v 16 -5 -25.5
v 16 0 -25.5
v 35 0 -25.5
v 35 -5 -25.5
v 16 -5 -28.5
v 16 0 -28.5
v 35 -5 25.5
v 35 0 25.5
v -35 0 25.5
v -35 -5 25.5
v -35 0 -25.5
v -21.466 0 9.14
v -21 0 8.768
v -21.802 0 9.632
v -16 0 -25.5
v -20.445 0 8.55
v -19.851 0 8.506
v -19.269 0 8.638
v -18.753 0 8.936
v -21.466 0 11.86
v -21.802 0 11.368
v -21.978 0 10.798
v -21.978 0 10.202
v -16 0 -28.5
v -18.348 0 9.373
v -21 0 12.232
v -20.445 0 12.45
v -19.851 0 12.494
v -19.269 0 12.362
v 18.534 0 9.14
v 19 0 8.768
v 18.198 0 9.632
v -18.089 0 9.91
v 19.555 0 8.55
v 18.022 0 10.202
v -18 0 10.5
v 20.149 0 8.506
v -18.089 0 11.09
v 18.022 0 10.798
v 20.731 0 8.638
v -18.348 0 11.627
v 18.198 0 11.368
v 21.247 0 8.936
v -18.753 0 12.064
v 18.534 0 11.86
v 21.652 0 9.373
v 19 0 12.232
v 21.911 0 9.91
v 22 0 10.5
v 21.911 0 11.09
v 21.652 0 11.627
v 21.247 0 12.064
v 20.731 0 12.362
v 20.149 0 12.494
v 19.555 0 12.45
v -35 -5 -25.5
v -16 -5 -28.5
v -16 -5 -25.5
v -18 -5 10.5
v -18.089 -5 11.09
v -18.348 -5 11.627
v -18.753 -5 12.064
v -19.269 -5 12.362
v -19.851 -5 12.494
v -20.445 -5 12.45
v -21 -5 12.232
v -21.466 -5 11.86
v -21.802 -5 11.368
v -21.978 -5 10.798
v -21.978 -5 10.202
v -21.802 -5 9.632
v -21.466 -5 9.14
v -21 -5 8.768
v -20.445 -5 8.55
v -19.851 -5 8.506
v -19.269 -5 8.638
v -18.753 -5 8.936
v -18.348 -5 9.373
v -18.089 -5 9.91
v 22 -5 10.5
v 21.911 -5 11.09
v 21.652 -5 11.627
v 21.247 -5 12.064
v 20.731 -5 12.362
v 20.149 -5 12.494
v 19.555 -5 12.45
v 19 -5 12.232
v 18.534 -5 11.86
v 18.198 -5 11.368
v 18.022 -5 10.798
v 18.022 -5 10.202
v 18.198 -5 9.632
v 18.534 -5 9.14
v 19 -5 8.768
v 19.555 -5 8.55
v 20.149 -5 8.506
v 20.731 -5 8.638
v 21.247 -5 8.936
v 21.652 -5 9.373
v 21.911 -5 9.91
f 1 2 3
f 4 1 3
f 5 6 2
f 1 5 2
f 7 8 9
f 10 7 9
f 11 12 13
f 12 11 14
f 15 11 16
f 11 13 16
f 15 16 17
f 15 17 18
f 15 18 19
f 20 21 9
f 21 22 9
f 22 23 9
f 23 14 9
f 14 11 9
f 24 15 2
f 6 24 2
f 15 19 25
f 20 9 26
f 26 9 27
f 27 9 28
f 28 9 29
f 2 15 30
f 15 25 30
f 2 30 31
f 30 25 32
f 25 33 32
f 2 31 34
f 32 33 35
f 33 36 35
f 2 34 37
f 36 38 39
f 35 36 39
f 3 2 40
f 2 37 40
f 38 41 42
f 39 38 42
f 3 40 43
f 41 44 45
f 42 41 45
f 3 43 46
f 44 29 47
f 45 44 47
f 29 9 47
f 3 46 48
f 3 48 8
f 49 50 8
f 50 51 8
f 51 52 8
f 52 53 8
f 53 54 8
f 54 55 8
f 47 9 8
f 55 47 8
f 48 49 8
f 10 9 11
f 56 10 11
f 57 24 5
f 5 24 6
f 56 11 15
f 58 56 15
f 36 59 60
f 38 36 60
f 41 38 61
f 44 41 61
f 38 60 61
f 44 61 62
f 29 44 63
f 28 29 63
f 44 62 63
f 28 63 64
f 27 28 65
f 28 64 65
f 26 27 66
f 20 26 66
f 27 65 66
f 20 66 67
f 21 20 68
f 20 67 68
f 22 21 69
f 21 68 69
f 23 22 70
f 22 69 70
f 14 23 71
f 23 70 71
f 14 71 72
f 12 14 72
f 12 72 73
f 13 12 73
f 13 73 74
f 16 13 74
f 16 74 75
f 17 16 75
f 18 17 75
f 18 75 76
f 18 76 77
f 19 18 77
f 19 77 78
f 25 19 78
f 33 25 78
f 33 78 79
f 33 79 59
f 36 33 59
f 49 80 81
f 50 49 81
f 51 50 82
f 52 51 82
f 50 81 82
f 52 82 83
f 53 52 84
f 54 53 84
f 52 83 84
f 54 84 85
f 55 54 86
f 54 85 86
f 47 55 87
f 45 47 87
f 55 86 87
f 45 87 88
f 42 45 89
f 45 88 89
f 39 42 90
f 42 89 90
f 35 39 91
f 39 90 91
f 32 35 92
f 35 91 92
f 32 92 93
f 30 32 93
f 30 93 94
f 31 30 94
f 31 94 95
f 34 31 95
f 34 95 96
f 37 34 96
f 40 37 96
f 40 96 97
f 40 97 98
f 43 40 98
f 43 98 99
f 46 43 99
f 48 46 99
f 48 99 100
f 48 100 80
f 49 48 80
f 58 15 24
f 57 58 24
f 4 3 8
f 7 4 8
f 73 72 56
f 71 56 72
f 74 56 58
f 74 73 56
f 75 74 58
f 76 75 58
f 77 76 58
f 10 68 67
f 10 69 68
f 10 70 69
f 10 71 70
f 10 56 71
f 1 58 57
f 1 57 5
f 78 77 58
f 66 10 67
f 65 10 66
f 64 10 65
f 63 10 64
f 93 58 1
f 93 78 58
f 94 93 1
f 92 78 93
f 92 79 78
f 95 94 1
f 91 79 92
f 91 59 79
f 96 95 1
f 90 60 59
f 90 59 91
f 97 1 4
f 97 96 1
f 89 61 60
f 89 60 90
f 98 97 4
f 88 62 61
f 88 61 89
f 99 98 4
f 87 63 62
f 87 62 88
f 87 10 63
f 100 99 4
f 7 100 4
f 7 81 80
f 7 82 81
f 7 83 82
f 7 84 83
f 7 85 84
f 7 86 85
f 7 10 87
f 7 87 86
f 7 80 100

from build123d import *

# Parameters (mm, degrees)
F1_DEPTH = 5
F2_R     = 2
F3_DEPTH = 25


with BuildPart() as f1:
    # F0 (on Front) → F1 (new body)
    with BuildSketch(Plane.XZ):
        Polygon((35, -25.5), (35, 25.5), (-35, 25.5), (-35, -25.5), (-16, -25.5), (-16, -28.5), (16, -28.5), (16, -25.5), align=None)
    extrude(amount=F1_DEPTH)

    # F2 (on face) → F3 (cut)
    with BuildSketch(Plane.XZ.offset(5)):
        with Locations((-20, 10.5)):
            Circle(F2_R)
        with Locations((20, 10.5)):
            Circle(F2_R)
    extrude(amount=-F3_DEPTH, mode=Mode.SUBTRACT)


solid = f1.part
